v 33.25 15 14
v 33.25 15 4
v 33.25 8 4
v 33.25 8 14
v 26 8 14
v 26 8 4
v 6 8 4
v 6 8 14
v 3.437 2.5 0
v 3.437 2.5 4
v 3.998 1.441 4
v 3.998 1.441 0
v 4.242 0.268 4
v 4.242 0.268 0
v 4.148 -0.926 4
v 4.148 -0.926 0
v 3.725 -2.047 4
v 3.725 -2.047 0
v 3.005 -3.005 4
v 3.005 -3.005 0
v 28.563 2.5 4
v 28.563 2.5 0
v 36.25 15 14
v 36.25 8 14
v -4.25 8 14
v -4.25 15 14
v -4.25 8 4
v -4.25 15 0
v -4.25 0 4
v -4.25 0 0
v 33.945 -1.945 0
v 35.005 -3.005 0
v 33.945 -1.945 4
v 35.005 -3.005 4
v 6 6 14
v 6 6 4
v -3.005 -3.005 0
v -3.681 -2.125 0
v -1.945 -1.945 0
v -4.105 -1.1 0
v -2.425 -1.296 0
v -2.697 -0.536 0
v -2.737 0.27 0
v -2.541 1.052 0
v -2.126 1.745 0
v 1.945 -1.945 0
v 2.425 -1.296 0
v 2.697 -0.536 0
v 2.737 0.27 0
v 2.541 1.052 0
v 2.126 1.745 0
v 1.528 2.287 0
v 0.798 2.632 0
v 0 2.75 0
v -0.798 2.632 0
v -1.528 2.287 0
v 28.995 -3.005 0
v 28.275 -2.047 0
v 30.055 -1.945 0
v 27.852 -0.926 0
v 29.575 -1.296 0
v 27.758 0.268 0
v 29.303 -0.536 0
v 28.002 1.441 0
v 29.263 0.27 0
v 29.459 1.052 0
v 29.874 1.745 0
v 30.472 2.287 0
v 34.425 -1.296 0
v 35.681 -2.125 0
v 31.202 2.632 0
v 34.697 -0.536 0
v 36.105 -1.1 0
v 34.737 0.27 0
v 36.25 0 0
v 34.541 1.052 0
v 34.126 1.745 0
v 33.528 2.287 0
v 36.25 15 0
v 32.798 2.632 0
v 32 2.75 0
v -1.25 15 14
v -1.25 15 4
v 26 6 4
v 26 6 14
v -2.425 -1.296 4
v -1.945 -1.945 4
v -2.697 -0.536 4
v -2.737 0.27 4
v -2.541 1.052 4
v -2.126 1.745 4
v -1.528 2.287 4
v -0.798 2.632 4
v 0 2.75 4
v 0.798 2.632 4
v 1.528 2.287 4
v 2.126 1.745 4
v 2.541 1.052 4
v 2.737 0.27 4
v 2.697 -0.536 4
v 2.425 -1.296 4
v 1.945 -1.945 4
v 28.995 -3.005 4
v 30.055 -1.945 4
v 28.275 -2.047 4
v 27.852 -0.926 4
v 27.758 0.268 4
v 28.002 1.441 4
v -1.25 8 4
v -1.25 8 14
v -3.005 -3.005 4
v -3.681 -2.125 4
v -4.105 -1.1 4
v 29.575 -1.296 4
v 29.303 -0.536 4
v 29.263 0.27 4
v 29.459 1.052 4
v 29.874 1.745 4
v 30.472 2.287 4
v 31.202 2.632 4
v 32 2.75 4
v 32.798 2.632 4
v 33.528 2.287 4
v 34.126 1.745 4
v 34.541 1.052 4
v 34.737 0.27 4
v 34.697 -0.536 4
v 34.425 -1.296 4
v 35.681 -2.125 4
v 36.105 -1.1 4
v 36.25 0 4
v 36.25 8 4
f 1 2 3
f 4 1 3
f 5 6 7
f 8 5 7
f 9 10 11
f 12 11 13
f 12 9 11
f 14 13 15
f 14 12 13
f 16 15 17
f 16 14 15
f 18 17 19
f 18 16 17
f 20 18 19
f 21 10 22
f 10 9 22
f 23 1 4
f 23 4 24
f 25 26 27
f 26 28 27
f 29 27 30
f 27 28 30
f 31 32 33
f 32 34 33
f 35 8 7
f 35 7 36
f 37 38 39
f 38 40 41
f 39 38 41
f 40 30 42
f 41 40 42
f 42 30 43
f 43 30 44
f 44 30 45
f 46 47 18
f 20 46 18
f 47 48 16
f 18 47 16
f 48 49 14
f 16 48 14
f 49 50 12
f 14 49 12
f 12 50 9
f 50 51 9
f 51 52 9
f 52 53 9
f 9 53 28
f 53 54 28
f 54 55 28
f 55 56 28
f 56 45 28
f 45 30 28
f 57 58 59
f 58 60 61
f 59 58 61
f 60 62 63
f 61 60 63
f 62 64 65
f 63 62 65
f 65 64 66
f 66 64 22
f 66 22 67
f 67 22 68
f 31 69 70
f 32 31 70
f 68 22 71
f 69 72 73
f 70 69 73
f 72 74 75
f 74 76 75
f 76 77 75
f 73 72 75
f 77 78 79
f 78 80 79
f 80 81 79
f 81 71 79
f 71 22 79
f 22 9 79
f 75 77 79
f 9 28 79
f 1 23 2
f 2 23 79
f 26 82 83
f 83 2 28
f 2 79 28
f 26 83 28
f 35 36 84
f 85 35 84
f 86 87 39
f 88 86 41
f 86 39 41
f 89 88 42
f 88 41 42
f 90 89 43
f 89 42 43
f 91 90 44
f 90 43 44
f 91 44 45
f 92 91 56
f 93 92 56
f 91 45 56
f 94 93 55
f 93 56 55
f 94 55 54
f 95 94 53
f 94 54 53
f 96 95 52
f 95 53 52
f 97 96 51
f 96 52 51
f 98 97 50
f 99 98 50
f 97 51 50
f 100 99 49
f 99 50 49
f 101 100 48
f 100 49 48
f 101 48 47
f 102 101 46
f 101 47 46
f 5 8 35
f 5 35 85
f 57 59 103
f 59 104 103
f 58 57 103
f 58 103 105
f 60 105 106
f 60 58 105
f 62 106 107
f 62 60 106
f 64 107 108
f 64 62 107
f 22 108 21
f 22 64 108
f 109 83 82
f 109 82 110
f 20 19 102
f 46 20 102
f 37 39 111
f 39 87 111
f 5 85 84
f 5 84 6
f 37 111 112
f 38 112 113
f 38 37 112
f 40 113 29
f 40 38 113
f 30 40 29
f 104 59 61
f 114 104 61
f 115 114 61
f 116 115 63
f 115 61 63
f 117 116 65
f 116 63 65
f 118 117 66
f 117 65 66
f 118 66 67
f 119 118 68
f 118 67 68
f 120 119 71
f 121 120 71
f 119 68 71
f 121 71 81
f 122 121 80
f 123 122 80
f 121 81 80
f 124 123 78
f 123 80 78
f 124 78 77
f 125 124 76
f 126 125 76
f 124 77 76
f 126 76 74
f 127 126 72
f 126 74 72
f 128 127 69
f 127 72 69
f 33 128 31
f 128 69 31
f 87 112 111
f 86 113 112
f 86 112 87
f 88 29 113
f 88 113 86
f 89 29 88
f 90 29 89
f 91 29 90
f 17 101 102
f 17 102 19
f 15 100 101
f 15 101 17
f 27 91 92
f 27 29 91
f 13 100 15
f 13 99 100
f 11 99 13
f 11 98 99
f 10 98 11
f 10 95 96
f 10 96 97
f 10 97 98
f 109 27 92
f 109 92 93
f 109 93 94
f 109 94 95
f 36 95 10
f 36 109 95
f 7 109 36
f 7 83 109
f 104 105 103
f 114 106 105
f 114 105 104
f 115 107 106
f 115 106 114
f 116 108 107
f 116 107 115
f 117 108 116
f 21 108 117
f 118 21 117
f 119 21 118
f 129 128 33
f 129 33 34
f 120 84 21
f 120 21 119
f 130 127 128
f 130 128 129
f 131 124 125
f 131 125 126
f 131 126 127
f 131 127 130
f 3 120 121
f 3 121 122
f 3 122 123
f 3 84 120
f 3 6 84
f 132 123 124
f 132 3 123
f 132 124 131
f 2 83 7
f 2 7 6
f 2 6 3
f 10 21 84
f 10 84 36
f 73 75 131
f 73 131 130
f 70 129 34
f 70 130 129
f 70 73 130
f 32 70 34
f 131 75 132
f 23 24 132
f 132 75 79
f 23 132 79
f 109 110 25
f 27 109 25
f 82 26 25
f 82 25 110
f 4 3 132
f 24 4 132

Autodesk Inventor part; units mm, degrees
ref_plane "YZ Plane" through (0, 0, 0) normal (1, 0, 0) x (0, 1, 0)
ref_plane "XZ Plane" through (0, 0, 0) normal (0, 1, 0) x (-1, 0, 0)
ref_plane "XY Plane" through (0, 0, 0) normal (0, 0, 1) x (1, 0, 0)
sketch "Sketch1" plane through (0, 0, 0) normal (0, 0, 1) x (1, 0, 0)
  line L0 (0, 0) -> (32, 0) construction
  line L1 (32, 0) -> (32, 15) construction
  line L2 (32, 15) -> (0, 15) construction
  line L3 (0, 15) -> (0, 0) construction
  circle A0 centre (0, 0) radius 2.75
  circle A1 centre (32, 0) radius 2.75
  line L4 (16, 15) -> (16, 0)
  line L5 (36.25, 0) -> (36.25, 15)
  line L6 (36.25, 15) -> (-4.25, 15)
  line L7 (-4.25, 15) -> (-4.25, 0)
  circle A2 centre (0, 0) radius 4.25
  circle A3 centre (32, 0) radius 4.25
  line L8 (3.4369, 2.5) -> (28.5631, 2.5)
  point P0 (0, 4.25)
  point P1 (32, 4.25)
  dimension "d0" = 32
  dimension "d2" = 15
  dimension "d4" = 5.5
  dimension "d6" = 1.5
  dimension "d7" = 1.5
  dimension "d10" = 5.5
  dimension "d11" = 2.5
extrude "Extrusion1" add sketch "Sketch1" along normal blind 4
sketch "Sketch2" plane through (0, 0, 4) normal (0, 0, 1) x (1, 0, 0)
  line L0 (-4.25, 15) -> (-4.25, 0) projected
  line L1 (3.4369, 2.5) -> (28.5631, 2.5) projected
  line L2 (36.25, 0) -> (36.25, 15) projected
  line L3 (0, 0) -> (-4.0526, -4.0526)
  line L4 (-4.0526, -4.0526) -> (0.938, -9.0431)
  line L5 (0.938, -9.0431) -> (4.9905, -4.9905)
  line L6 (4.9905, -4.9905) -> (0, 0)
  circle A0 centre (32, 0) radius 2.75 construction
  line L7 (32, 0) -> (27.2846, -4.7154)
  line L8 (27.2846, -4.7154) -> (32.2729, -9.7038)
  line L9 (32.2729, -9.7038) -> (36.9883, -4.9883)
  line L10 (36.9883, -4.9883) -> (32, 0)
  dimension "d24" = 45
extrude "Extrusion2" cut sketch "Sketch2" against normal through all
sketch "Sketch3" plane through (0, 0, 4) normal (0, 0, 1) x (1, 0, 0)
  line L0 (-4.25, 15) -> (-1.25, 15)
  line L1 (-1.25, 15) -> (-1.25, 8)
  line L2 (-1.25, 8) -> (-4.25, 8)
  line L3 (-4.25, 8) -> (-4.25, 15)
  line L4 (36.25, 15) -> (33.25, 15)
  line L5 (33.25, 15) -> (33.25, 8)
  line L6 (33.25, 8) -> (36.25, 8)
  line L7 (36.25, 8) -> (36.25, 15)
  line L8 (6, 6) -> (26, 6)
  line L9 (26, 6) -> (26, 8)
  line L10 (26, 8) -> (6, 8)
  line L11 (6, 8) -> (6, 6)
  line L12 (3.4369, 2.5) -> (28.5631, 2.5) projected
  point P0 (0, 0)
  point P1 (16, 6)
  point P2 (16, 2.5)
  dimension "d18" = 3
  dimension "d19" = 7
  dimension "d20" = 3
  dimension "d21" = 7
  dimension "d25" = 2
  dimension "d26" = 20
extrude "Extrusion3" add sketch "Sketch3" along normal blind 10
equation "\"d4\" = d10"
equation "\"d7\" = d6"
equation "\"d20\" = d18"
equation "\"d21\" = d19"
properties part number "switch lever"
